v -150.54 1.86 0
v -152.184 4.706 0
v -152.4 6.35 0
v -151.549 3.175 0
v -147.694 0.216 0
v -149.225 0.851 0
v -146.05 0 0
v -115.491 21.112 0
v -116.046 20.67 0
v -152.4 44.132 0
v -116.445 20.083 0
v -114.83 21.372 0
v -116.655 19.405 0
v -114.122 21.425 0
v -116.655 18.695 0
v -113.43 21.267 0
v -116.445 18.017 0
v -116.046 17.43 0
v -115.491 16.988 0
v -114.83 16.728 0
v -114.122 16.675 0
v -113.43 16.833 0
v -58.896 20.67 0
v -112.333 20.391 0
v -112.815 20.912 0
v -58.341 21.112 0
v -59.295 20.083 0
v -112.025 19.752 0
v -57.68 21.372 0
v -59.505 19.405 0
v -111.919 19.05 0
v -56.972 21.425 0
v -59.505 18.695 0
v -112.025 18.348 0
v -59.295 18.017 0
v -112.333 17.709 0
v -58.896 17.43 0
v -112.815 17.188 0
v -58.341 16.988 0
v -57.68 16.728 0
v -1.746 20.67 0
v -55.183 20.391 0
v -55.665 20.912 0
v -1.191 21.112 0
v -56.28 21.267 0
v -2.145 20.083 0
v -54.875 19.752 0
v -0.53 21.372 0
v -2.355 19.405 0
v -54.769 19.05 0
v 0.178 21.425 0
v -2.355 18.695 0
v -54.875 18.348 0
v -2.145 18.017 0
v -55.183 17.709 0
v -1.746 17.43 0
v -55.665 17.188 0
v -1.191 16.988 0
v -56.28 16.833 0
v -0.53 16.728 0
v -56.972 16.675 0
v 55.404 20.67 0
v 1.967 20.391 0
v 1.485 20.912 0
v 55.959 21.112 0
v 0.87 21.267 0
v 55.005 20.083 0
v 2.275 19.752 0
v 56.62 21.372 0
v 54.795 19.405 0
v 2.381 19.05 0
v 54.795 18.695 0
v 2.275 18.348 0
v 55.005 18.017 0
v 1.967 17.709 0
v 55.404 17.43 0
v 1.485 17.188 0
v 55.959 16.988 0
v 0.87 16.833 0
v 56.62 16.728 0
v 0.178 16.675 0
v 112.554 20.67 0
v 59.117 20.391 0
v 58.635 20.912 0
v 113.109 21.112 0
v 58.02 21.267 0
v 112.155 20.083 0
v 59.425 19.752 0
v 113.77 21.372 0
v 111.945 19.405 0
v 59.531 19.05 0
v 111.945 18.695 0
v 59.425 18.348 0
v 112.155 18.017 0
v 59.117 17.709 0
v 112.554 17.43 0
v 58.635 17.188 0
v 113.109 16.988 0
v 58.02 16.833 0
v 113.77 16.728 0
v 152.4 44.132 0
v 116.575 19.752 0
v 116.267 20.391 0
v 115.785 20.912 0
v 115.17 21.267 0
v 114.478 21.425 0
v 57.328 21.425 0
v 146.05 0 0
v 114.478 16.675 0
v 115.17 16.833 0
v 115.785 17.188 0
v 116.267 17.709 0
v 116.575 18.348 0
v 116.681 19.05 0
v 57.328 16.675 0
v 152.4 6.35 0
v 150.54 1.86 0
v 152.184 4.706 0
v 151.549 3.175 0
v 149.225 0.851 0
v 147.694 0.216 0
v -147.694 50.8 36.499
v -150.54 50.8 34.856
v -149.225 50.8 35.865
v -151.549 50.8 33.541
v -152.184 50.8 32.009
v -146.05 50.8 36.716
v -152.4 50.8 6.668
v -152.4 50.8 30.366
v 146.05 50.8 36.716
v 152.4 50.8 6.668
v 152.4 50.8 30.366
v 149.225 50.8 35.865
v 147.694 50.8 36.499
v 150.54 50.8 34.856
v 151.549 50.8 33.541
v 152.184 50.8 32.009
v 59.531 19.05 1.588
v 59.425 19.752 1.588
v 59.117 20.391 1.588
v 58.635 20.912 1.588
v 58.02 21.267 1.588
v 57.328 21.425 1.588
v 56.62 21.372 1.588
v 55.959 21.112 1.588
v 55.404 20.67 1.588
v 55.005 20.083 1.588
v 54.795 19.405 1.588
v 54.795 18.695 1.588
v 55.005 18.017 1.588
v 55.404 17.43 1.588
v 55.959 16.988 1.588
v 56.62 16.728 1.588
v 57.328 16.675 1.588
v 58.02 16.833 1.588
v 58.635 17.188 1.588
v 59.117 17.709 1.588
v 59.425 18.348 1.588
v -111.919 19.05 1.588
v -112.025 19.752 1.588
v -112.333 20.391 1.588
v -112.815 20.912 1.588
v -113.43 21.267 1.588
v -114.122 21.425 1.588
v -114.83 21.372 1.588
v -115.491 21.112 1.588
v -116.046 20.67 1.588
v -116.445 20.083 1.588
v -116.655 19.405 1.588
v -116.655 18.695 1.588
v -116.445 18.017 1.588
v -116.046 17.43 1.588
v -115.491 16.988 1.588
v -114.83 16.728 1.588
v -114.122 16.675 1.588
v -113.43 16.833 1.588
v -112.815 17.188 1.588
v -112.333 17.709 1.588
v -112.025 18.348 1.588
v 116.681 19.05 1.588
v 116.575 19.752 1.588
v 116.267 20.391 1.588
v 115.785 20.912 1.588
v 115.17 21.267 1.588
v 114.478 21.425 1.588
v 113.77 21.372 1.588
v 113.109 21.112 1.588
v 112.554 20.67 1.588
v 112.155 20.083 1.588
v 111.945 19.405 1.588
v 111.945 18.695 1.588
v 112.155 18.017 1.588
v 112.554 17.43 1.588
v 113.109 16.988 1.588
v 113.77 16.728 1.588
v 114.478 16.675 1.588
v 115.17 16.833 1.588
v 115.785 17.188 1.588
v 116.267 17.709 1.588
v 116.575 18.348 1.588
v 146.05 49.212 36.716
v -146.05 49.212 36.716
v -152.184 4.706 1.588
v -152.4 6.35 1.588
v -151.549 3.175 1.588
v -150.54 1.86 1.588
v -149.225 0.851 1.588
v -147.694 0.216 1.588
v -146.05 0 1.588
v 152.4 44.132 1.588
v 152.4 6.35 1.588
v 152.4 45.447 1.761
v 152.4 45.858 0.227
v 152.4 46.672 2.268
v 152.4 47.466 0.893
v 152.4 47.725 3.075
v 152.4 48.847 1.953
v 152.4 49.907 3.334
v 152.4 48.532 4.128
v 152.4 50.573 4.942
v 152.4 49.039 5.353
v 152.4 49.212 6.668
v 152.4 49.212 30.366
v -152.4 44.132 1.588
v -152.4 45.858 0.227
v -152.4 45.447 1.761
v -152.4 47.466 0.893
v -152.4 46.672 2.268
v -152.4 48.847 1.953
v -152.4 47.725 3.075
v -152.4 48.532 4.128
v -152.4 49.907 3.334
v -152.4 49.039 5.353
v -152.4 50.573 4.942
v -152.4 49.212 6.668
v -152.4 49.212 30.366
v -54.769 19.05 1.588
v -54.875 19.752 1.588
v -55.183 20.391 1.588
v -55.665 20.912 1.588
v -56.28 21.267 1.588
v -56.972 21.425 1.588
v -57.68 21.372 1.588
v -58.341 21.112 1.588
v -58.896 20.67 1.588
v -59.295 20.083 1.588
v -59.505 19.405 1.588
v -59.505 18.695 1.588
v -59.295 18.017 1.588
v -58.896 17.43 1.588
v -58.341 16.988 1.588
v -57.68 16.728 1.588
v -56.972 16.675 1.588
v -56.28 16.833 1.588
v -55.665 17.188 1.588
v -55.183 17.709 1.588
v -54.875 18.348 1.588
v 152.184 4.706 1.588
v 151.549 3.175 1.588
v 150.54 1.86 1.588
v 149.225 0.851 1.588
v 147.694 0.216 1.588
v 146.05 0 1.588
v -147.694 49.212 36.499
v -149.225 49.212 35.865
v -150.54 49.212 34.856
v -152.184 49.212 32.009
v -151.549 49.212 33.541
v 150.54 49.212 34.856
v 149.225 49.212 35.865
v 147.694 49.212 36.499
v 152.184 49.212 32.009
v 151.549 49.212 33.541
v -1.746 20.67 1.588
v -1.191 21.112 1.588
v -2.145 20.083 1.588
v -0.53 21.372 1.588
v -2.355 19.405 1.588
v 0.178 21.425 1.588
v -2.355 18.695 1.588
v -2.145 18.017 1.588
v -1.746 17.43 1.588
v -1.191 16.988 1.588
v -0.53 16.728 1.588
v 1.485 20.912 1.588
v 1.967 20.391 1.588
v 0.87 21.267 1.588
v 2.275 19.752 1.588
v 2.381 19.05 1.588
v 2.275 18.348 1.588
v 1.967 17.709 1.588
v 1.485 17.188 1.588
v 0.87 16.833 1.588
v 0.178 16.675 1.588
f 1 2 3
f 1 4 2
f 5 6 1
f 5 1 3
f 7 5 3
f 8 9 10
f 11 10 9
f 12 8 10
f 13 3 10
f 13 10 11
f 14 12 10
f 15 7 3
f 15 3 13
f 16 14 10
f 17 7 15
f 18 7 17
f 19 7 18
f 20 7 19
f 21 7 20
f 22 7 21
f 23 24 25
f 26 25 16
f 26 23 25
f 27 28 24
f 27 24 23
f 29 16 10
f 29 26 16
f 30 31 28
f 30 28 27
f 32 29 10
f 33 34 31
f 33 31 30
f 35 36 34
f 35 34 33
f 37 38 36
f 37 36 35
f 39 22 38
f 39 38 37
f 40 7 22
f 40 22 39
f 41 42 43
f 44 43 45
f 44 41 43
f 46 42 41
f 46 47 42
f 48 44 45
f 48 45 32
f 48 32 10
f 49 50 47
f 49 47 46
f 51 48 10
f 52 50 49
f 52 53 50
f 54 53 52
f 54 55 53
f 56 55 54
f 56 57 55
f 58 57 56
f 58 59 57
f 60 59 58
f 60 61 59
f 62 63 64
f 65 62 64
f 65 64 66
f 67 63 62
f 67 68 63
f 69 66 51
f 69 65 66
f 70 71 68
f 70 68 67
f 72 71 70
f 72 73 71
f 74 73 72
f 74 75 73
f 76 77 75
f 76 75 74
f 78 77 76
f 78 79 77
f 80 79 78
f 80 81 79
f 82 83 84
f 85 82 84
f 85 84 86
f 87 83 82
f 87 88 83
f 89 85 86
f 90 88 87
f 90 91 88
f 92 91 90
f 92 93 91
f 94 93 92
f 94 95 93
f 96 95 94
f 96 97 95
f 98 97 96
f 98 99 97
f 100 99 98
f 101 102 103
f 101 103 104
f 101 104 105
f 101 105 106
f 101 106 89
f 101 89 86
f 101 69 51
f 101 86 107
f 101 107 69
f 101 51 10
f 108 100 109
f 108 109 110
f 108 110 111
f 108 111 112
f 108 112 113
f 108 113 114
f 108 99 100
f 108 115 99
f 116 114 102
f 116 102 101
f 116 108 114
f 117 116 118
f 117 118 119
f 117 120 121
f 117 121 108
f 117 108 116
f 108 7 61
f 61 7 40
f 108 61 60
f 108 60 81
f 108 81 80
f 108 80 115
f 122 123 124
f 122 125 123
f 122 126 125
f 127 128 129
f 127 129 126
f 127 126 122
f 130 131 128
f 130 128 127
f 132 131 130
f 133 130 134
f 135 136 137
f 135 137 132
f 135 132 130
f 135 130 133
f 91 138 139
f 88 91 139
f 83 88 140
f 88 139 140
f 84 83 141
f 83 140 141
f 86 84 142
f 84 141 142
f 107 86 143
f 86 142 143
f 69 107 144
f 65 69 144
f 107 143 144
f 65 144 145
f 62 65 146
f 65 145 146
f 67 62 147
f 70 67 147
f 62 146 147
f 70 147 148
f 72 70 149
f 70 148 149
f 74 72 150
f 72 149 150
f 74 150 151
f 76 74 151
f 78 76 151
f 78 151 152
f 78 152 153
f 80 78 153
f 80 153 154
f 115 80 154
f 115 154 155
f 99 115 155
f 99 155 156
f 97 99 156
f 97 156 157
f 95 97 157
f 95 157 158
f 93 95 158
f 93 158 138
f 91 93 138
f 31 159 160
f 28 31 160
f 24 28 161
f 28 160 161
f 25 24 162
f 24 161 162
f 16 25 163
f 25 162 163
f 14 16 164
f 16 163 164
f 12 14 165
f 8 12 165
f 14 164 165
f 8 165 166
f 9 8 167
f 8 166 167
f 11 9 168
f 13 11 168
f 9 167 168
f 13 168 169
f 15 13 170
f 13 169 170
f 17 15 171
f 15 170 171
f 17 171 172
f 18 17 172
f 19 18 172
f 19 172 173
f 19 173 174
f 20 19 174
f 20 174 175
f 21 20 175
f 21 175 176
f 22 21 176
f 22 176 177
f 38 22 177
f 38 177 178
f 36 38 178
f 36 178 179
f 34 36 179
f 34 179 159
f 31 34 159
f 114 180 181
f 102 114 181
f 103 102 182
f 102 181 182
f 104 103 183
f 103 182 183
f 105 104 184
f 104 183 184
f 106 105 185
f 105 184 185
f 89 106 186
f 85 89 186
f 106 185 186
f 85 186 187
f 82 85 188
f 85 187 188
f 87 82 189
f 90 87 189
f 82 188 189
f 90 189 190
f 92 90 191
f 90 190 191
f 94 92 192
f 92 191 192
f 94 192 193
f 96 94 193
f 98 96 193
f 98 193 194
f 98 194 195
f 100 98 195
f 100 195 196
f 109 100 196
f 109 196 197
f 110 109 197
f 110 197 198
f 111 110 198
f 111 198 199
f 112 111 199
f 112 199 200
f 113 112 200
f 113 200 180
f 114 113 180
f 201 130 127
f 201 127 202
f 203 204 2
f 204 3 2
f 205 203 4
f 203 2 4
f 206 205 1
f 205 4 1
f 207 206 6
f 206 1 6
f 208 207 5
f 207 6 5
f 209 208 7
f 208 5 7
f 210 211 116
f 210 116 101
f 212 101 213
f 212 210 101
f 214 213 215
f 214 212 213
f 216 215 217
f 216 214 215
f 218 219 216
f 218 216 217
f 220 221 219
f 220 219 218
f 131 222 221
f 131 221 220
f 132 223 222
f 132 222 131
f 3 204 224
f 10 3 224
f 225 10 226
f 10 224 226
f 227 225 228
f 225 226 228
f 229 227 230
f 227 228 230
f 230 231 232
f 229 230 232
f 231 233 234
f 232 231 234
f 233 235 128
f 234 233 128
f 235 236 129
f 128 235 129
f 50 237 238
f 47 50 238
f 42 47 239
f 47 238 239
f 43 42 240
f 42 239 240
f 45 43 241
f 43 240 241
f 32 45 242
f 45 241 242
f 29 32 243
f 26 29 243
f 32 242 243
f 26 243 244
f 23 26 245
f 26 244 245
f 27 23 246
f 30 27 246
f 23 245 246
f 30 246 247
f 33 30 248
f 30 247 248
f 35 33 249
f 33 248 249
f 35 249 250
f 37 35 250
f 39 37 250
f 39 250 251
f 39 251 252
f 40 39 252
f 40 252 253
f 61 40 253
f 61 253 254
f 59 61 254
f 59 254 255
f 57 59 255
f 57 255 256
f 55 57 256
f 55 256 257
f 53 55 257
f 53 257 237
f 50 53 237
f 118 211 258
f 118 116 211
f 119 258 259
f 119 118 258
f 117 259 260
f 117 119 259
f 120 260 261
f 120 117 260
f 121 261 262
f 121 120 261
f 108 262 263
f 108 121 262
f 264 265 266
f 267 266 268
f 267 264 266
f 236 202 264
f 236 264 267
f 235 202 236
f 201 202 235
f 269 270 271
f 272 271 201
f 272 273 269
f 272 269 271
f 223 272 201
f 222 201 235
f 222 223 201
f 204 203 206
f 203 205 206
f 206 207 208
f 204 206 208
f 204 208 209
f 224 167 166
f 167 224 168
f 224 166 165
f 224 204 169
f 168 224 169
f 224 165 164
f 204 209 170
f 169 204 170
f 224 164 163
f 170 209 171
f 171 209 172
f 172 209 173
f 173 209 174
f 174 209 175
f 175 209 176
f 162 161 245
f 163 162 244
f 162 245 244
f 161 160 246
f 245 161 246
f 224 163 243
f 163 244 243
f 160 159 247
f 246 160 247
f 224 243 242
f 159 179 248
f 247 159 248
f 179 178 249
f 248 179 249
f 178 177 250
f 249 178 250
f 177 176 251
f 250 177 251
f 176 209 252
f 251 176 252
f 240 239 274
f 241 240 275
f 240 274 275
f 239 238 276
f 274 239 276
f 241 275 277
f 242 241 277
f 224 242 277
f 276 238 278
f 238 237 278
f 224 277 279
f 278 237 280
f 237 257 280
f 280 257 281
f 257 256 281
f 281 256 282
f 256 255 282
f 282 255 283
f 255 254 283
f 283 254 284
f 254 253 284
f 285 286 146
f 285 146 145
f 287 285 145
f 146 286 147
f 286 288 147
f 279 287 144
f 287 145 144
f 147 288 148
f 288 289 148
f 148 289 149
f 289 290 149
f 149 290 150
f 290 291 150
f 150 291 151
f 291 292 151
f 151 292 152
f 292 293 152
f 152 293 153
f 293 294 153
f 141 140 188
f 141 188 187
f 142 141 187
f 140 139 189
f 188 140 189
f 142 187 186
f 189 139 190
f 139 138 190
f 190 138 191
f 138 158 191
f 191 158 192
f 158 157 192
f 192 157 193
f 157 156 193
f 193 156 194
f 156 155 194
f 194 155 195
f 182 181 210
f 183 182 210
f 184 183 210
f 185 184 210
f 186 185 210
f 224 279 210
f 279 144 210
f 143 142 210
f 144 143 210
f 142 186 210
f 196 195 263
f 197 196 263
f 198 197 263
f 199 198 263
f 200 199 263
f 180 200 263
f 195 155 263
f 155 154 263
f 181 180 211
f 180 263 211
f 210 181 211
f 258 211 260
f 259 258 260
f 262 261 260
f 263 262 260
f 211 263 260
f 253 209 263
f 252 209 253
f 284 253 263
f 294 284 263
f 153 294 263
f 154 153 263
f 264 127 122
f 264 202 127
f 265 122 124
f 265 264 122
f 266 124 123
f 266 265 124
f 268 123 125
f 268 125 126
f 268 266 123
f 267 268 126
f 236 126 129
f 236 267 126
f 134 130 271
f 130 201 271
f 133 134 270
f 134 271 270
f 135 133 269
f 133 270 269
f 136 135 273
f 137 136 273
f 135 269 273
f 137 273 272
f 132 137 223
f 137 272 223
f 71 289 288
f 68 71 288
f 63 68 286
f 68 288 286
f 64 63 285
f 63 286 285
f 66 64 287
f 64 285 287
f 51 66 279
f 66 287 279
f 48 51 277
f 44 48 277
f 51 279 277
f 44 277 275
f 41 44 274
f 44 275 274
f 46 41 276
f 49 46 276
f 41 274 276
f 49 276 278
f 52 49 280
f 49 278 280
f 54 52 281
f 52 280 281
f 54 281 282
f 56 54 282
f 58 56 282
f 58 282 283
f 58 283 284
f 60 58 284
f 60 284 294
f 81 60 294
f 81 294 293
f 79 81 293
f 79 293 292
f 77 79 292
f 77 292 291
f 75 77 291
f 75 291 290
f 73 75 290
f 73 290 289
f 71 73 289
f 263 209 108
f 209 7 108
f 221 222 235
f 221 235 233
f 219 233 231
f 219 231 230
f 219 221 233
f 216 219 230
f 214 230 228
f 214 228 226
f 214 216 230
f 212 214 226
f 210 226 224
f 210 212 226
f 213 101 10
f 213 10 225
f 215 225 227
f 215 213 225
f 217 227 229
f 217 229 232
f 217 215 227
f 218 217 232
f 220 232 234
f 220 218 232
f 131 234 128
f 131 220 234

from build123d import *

# Parameters (mm, degrees)
SKETCH1_W                    = 304.8
SKETCH1_H                    = 1.5875
BASE_FLANGE1_DEPTH           = 50.8
EDGE_FLANGE1_STRIP_W         = 16.51
EDGE_FLANGE1_STRIP_H         = 1.5875
EDGE_FLANGE1_STRIP_CUT_DEPTH = 304.8
EDGE_FLANGE1_DEPTH           = 304.8
SKETCH10_R                   = 2.38125
CUT_EXTRUDE1_DEPTH           = 165.439625502
FILLET1_R                    = 6.35


# Sheet-metal steps are written as plain solids
with BuildPart() as part:
    # Sketch1 → Base-Flange1 (new body)
    with BuildSketch(Plane(origin=(0, 0, 0), x_dir=(1, 0, 0), z_dir=(0, 1, 0))):
        with Locations((0, -0.79375)):
            Rectangle(SKETCH1_W, SKETCH1_H)
    extrude(amount=BASE_FLANGE1_DEPTH)

    # Edge-Flange1 strip (across the edge) → Edge-Flange1 strip cut (cut)
    with BuildSketch(Plane(origin=(152.4, 50.8, 1.5875), x_dir=(0, -1, 0), z_dir=(-1, 0, 0))):
        with Locations((-1.5875, -0.79375)):
            Rectangle(EDGE_FLANGE1_STRIP_W, EDGE_FLANGE1_STRIP_H)
    extrude(amount=EDGE_FLANGE1_STRIP_CUT_DEPTH, mode=Mode.SUBTRACT)

    # Edge-Flange1 section (across the edge) → Edge-Flange1 (add)
    with BuildSketch(Plane(origin=(152.4, 50.8, 1.5875), x_dir=(0, -1, 0), z_dir=(-1, 0, 0))):
        with BuildLine():
            Line((0, 5.08), (0, 35.1282))
            Line((0, 35.1282), (1.5875, 35.1282))
            Line((1.5875, 35.1282), (1.5875, 5.08))
            ThreePointArc((1.5875, 5.08), (3.075397552, 1.487897552), (6.6675, 0))
            Line((6.6675, 0), (6.6675, -1.5875))
            ThreePointArc((6.6675, -1.5875), (1.952865536, 0.365365536), (0, 5.08))
        make_face()
    extrude(amount=EDGE_FLANGE1_DEPTH)

    # Sketch10 → Cut-Extrude1 (cut, through all)
    with BuildSketch(Plane.XY.offset(1.5875)):
        with Locations((-114.3, 19.05)):
            Circle(SKETCH10_R)
        with Locations((114.3, 19.05)):
            Circle(SKETCH10_R)
        with Locations((0, 19.05)):
            Circle(SKETCH10_R)
        with Locations((57.15, 19.05)):
            Circle(SKETCH10_R)
        with Locations((-57.15, 19.05)):
            Circle(SKETCH10_R)
    extrude(amount=-CUT_EXTRUDE1_DEPTH, mode=Mode.SUBTRACT)

    # Fillet1
    fillet1_edges = [part.edges().sort_by_distance(p)[0] for p in [
        (152.4, 50.00625, 36.7157),
        (-152.4, 50.00625, 36.7157),
        (-152.4, 0, 0.79375),
        (152.4, 0, 0.79375),
    ]]
    fillet(fillet1_edges, radius=FILLET1_R)


solid = part.part
